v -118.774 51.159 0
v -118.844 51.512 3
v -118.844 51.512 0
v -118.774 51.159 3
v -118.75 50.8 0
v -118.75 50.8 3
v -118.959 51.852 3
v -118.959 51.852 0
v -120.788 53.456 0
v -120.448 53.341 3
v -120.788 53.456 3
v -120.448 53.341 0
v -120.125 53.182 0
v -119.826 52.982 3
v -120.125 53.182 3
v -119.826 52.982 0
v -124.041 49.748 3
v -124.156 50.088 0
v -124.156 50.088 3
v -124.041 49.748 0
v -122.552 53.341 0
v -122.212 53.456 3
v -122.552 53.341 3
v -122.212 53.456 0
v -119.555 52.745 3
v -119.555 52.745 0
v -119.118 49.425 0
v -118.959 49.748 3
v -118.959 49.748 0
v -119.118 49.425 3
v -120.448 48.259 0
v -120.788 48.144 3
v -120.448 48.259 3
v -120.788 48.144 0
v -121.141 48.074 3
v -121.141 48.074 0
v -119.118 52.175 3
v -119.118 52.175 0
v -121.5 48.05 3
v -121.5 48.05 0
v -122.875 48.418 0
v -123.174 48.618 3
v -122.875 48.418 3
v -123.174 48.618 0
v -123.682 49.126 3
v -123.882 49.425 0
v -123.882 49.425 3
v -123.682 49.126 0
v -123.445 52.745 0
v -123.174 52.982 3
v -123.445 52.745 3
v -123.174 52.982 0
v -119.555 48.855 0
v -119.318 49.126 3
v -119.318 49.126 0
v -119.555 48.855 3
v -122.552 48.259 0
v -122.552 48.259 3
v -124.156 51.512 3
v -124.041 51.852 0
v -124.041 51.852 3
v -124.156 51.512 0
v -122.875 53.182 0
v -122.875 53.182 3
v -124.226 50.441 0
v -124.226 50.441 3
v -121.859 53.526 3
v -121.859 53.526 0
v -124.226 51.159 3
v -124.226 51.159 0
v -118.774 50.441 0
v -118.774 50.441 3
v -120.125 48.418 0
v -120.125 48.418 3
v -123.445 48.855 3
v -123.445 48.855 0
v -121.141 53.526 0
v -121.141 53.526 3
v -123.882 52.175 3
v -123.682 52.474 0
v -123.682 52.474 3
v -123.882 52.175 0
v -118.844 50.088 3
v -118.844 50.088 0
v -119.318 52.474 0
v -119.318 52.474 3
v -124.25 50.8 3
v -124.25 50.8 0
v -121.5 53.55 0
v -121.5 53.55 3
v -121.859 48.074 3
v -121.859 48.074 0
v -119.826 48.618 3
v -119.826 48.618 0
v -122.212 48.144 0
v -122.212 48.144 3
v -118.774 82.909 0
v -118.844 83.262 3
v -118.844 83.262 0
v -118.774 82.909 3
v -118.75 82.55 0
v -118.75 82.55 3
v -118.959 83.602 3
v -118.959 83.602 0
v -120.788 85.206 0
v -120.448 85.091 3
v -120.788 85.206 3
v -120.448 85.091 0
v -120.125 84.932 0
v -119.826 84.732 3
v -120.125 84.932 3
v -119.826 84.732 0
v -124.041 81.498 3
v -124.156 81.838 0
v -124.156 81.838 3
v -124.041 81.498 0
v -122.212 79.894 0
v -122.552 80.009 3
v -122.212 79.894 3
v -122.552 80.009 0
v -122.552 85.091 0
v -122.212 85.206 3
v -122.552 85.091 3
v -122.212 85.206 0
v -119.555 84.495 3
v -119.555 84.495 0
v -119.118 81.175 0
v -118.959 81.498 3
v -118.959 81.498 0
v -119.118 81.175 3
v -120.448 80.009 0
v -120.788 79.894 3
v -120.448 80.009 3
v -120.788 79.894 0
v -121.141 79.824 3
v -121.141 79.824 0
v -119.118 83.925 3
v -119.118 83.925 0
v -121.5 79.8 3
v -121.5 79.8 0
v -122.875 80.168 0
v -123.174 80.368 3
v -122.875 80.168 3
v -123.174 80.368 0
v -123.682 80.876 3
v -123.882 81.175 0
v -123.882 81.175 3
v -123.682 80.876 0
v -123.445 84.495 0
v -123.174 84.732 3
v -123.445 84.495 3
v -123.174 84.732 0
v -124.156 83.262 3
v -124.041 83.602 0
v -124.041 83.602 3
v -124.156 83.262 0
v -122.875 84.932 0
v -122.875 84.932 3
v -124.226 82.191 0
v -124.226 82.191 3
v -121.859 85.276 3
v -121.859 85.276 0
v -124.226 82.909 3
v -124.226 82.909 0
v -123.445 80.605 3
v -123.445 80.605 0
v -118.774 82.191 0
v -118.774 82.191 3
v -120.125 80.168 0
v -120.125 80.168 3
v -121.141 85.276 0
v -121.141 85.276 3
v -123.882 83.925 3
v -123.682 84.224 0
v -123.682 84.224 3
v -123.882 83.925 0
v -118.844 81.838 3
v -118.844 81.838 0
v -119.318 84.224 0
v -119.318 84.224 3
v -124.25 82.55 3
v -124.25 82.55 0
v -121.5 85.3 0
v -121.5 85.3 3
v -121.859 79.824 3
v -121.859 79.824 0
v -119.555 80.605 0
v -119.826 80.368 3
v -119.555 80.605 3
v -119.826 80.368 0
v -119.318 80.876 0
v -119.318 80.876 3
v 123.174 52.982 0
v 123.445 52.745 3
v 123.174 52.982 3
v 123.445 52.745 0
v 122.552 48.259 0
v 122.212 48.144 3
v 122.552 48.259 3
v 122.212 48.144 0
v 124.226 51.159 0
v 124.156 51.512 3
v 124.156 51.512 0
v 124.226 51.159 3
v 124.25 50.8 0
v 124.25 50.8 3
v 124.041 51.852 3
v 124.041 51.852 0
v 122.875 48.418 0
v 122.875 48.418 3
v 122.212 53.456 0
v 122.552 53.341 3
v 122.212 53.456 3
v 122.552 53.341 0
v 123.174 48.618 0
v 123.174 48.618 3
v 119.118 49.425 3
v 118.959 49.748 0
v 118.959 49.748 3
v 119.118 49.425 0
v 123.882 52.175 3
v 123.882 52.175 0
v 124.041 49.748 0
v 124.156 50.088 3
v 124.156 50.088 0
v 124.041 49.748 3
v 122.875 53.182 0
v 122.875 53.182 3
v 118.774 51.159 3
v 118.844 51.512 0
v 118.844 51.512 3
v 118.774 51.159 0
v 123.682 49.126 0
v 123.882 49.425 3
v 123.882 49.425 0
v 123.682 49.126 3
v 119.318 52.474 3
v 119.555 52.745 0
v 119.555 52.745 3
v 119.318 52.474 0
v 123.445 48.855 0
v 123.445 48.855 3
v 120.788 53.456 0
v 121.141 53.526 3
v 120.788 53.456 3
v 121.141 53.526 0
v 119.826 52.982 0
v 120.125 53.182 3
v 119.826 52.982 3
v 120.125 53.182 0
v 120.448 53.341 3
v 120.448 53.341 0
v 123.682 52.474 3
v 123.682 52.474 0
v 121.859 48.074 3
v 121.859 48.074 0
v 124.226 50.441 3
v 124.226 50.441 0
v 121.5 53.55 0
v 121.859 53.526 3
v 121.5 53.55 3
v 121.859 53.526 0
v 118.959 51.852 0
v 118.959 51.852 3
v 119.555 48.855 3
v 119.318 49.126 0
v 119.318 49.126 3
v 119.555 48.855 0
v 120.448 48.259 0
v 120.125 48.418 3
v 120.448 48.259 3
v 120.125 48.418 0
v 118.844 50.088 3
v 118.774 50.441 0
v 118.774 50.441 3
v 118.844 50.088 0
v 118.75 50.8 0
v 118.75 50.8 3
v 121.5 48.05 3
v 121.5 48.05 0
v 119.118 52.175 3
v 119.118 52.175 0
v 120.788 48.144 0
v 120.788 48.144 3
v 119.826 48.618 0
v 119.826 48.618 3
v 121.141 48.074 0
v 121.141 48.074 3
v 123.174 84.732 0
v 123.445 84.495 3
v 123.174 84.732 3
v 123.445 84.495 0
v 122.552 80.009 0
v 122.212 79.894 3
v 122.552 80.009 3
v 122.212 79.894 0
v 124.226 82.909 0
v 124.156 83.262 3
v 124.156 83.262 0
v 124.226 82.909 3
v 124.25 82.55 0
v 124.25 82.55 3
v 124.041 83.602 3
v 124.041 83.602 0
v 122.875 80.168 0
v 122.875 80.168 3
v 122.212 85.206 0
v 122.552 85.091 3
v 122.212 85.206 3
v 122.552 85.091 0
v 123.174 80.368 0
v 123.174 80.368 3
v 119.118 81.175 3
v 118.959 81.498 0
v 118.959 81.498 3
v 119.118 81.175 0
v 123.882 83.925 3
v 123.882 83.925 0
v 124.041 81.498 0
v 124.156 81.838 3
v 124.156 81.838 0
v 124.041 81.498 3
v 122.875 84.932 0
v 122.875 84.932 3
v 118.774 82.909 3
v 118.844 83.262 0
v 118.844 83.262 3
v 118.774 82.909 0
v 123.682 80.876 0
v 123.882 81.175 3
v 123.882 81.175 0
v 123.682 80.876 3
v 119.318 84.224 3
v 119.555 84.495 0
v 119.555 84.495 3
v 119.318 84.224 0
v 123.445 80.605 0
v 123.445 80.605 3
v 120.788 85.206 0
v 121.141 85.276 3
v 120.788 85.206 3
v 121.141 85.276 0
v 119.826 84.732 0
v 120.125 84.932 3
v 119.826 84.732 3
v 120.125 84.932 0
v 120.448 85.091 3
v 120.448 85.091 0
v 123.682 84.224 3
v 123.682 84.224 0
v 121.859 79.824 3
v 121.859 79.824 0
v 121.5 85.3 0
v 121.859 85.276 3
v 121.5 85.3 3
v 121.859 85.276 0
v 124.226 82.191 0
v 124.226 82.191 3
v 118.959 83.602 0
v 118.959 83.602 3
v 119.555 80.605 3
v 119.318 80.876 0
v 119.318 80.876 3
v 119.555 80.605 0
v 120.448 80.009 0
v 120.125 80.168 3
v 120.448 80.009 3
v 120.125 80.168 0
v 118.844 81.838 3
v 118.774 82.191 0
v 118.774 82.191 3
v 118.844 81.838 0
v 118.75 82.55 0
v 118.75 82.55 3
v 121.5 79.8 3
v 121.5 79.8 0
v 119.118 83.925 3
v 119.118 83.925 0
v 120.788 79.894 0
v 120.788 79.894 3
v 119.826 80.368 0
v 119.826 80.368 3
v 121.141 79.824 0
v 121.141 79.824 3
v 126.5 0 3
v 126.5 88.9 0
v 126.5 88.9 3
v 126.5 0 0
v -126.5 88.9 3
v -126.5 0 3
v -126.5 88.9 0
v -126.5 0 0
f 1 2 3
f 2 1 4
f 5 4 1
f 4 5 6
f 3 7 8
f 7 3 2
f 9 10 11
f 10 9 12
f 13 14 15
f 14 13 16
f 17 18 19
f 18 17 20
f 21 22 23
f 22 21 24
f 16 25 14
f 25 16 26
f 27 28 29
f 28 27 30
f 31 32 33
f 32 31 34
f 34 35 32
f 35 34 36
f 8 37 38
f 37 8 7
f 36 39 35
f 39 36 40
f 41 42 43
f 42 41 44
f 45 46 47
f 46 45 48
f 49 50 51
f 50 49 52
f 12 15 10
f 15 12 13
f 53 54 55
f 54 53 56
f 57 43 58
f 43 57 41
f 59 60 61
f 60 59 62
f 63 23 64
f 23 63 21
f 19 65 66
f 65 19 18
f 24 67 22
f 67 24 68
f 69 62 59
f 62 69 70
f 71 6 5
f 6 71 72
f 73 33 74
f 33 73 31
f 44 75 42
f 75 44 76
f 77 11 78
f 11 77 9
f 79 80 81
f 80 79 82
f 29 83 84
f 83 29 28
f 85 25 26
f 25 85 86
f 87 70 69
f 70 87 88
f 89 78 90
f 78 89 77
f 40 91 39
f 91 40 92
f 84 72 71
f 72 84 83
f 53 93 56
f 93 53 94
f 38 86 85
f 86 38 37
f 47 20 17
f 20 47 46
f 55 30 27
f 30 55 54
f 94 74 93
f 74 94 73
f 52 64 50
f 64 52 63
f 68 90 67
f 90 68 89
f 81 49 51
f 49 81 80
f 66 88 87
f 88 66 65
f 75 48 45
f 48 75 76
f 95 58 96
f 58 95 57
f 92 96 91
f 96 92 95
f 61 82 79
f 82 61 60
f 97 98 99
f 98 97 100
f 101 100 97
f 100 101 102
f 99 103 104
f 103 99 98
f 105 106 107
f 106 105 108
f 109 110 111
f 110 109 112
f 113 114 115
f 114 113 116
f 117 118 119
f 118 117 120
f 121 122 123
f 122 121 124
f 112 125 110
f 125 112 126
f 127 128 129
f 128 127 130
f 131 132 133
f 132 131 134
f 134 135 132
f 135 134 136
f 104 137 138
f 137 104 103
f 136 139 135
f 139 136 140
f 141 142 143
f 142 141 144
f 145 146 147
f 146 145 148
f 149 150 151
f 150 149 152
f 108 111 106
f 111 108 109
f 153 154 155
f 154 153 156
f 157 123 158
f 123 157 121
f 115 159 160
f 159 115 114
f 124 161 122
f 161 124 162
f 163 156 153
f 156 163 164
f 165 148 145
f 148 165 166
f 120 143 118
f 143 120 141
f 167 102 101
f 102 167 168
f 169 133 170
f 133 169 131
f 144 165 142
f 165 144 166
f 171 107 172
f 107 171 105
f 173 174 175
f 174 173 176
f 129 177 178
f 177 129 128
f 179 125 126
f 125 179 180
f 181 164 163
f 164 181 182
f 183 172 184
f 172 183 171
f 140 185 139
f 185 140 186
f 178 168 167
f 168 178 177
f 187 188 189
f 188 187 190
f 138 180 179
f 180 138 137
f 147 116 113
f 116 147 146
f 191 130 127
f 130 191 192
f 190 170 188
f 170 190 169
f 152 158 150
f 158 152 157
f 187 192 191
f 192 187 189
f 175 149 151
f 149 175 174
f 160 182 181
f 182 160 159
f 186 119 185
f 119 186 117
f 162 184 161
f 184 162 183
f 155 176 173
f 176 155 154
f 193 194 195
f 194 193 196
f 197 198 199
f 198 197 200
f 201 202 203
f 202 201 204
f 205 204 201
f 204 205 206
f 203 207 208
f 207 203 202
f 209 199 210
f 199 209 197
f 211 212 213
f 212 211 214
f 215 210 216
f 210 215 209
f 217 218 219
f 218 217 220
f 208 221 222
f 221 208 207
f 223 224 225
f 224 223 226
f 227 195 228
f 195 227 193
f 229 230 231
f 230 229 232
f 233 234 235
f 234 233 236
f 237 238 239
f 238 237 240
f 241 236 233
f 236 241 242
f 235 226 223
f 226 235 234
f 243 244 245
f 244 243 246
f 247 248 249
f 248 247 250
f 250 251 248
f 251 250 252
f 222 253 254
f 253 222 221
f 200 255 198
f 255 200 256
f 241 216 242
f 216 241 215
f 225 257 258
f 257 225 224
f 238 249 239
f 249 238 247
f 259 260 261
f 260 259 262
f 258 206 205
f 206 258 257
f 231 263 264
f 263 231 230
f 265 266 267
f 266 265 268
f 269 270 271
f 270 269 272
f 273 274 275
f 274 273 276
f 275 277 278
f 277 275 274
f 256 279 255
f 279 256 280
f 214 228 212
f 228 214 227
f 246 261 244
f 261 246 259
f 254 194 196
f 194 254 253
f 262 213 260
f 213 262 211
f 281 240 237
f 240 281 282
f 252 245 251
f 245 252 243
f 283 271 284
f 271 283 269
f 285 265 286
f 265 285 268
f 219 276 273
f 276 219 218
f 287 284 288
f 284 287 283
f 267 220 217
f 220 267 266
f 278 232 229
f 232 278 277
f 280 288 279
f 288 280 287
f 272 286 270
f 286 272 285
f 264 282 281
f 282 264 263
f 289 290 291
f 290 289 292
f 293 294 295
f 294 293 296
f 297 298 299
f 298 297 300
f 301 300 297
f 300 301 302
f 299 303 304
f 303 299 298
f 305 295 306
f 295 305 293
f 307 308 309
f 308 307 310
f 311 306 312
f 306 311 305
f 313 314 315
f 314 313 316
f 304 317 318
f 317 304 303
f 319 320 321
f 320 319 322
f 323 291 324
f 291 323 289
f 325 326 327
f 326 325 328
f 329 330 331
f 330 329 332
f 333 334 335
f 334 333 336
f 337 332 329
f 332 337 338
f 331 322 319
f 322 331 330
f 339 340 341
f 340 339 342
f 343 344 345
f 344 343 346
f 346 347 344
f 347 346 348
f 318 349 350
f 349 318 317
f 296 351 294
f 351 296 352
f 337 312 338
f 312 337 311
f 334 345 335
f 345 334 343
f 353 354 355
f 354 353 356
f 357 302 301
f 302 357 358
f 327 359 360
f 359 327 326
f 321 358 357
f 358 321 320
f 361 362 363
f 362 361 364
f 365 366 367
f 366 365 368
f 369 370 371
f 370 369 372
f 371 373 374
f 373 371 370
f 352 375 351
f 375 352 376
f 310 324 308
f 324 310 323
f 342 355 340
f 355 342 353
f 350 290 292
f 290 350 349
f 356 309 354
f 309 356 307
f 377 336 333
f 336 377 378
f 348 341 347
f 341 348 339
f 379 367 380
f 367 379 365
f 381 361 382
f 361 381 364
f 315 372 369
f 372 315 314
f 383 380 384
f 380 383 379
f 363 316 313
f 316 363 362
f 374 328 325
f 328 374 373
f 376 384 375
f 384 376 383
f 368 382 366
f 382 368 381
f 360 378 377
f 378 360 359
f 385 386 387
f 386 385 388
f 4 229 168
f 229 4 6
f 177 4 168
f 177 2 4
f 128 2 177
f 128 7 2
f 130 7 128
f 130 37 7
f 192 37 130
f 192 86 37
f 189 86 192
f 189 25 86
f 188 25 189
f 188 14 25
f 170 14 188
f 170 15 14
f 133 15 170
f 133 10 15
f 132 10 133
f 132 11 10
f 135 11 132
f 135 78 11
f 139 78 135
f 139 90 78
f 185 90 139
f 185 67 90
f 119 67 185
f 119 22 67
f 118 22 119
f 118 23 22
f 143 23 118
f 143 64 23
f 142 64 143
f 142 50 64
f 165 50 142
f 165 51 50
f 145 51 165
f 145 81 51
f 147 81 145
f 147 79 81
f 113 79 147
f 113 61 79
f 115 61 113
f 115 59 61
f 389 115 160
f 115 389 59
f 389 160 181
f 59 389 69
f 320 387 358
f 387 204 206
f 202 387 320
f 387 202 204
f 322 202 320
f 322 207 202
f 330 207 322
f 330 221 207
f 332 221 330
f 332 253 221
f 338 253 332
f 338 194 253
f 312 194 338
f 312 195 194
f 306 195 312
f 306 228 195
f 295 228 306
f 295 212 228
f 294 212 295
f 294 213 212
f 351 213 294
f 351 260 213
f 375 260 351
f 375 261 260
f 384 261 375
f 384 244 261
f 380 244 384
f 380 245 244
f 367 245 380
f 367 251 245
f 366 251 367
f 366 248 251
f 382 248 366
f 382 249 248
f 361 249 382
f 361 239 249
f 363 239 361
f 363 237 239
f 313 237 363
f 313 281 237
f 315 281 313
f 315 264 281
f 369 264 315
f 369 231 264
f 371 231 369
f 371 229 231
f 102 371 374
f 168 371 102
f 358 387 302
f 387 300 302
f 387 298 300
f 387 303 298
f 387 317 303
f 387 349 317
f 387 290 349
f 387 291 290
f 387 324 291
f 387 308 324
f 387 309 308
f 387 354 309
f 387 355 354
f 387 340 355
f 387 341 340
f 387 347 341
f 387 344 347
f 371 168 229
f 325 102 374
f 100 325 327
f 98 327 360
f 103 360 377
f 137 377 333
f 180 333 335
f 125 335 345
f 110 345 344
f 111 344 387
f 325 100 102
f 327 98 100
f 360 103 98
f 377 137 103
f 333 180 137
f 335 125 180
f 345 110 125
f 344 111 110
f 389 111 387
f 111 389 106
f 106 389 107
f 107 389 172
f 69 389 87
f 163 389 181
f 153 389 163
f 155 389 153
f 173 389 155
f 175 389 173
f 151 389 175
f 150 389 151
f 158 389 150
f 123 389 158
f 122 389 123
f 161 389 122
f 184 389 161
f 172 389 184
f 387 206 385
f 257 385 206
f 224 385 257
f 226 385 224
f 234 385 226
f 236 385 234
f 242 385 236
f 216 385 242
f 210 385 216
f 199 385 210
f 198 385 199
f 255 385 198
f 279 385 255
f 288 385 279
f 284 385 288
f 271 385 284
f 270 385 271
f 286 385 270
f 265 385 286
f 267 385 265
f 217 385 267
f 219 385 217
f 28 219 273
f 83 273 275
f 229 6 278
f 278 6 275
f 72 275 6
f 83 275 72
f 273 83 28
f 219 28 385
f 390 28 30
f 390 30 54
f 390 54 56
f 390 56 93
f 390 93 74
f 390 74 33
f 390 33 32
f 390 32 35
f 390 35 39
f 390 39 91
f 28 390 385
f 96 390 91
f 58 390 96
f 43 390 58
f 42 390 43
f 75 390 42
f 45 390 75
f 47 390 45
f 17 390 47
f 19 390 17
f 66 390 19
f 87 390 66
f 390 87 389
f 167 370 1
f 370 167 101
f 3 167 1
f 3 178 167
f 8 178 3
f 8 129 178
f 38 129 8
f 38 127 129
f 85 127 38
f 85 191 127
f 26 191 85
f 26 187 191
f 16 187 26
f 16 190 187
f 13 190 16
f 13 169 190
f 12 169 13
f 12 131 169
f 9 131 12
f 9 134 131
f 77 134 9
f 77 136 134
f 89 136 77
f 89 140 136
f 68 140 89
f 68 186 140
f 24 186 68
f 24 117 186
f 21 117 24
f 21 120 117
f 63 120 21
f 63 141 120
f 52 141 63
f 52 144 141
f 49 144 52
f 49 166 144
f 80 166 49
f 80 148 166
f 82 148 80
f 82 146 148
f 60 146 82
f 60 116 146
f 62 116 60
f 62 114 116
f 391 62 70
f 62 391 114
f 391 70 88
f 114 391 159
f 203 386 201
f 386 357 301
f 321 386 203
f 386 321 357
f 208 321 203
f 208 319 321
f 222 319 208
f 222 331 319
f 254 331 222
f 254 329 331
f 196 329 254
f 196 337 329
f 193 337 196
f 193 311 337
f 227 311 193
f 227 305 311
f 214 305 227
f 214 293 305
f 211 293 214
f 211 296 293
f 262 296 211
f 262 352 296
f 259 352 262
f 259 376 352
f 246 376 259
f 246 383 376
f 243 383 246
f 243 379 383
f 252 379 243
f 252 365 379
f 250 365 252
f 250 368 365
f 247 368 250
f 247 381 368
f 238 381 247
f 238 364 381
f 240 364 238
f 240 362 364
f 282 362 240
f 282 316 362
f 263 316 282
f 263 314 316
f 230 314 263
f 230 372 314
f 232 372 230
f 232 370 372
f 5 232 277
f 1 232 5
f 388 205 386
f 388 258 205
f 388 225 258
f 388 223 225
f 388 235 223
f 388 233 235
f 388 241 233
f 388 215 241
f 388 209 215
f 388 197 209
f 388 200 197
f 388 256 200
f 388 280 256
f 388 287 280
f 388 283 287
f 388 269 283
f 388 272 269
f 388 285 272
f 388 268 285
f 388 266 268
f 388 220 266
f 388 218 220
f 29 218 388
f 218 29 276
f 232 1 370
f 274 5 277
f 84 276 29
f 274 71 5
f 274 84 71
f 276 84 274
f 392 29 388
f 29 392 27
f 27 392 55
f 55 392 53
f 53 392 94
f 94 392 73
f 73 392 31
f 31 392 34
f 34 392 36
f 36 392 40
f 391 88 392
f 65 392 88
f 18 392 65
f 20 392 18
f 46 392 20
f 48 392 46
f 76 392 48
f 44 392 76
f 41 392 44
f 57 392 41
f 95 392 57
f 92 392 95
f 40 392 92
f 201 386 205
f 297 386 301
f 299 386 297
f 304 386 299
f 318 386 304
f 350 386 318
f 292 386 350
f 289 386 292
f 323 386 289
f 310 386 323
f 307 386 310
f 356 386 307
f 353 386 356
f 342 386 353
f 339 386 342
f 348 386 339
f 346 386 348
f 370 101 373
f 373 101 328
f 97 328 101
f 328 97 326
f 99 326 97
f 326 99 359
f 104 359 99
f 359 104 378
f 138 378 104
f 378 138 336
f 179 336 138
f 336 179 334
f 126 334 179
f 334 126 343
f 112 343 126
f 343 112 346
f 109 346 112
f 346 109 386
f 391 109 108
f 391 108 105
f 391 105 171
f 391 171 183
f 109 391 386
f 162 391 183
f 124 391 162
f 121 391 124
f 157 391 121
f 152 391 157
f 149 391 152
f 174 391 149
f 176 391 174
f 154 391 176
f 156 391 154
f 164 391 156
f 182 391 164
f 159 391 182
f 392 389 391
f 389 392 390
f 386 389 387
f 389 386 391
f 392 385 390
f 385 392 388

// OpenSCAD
// =============================================================================
// CONSOLE10 — Blank 2U Faceplate  v0.1
//
// A featureless 2U filler panel. Bolts to the cheek SLANT inserts via the
// standard 2-per-side hole pattern. Nothing on the front face. Use for empty
// rack bays or as a starting point for a custom one-off panel.
// =============================================================================

// ---------- module geometry the plate must mate to ----------
panel_width   = 253;      // 10" mini-rack width
cheek_thick   = 10;
slant_angle   = 30;
U             = 44.45;
interior_half = panel_width/2 - cheek_thick;   // 116.5
cheek_ctr_x   = interior_half + cheek_thick/2; // 121.5

// ---------- flat plate ----------
n_u      = 2;
plate_w  = 253;
plate_h  = n_u * U;       // 88.9
plate_t  = 3;             // uniform thickness

// ---------- slant-insert mount holes ----------
// 2U plate spans s=0..88.9 along the slant. Only U-row 0 has cheek holes that
// fit on the plate: 50.80, 66.675, 82.55. Use the wide pair (50.80, 82.55)
// for the strongest vertical grip.
mount_y      = [50.80, 82.55];
m10_32_clear = 5.5;

show_on_slant = false;
floor_t       = 6;        // bottom-panel slab thickness (for fit-check)

$fn = 48;

echo(str("BLANK FACEPLATE v0.1 ", plate_w, " x ", plate_h, " (", n_u, "U) t", plate_t,
         " | mounts ", len(mount_y)*2, " (M10-32 clr ", m10_32_clear, ")"));

// =============================================================================
// PANEL — flat 2U 3 mm slab with the 4 slant-insert mount holes.
// =============================================================================
module panel() {
    difference() {
        translate([-plate_w/2, 0, 0]) cube([plate_w, plate_h, plate_t]);
        for (sx = [-cheek_ctr_x, cheek_ctr_x])
            for (y = mount_y)
                translate([sx, y, -1]) cylinder(d = m10_32_clear, h = plate_t + 2);
    }
}

// Fit-check: lay the flat plate onto the 30 deg slant.
module blank_on_slant() {
    translate([0, 0, floor_t])
        rotate([90 - slant_angle, 0, 0])
            color("Gainsboro") panel();
}

// Public entry the module assembly calls:
module blank_faceplate_on_slant() { blank_on_slant(); }

if (show_on_slant) blank_on_slant();
else               color("Gainsboro") panel();
